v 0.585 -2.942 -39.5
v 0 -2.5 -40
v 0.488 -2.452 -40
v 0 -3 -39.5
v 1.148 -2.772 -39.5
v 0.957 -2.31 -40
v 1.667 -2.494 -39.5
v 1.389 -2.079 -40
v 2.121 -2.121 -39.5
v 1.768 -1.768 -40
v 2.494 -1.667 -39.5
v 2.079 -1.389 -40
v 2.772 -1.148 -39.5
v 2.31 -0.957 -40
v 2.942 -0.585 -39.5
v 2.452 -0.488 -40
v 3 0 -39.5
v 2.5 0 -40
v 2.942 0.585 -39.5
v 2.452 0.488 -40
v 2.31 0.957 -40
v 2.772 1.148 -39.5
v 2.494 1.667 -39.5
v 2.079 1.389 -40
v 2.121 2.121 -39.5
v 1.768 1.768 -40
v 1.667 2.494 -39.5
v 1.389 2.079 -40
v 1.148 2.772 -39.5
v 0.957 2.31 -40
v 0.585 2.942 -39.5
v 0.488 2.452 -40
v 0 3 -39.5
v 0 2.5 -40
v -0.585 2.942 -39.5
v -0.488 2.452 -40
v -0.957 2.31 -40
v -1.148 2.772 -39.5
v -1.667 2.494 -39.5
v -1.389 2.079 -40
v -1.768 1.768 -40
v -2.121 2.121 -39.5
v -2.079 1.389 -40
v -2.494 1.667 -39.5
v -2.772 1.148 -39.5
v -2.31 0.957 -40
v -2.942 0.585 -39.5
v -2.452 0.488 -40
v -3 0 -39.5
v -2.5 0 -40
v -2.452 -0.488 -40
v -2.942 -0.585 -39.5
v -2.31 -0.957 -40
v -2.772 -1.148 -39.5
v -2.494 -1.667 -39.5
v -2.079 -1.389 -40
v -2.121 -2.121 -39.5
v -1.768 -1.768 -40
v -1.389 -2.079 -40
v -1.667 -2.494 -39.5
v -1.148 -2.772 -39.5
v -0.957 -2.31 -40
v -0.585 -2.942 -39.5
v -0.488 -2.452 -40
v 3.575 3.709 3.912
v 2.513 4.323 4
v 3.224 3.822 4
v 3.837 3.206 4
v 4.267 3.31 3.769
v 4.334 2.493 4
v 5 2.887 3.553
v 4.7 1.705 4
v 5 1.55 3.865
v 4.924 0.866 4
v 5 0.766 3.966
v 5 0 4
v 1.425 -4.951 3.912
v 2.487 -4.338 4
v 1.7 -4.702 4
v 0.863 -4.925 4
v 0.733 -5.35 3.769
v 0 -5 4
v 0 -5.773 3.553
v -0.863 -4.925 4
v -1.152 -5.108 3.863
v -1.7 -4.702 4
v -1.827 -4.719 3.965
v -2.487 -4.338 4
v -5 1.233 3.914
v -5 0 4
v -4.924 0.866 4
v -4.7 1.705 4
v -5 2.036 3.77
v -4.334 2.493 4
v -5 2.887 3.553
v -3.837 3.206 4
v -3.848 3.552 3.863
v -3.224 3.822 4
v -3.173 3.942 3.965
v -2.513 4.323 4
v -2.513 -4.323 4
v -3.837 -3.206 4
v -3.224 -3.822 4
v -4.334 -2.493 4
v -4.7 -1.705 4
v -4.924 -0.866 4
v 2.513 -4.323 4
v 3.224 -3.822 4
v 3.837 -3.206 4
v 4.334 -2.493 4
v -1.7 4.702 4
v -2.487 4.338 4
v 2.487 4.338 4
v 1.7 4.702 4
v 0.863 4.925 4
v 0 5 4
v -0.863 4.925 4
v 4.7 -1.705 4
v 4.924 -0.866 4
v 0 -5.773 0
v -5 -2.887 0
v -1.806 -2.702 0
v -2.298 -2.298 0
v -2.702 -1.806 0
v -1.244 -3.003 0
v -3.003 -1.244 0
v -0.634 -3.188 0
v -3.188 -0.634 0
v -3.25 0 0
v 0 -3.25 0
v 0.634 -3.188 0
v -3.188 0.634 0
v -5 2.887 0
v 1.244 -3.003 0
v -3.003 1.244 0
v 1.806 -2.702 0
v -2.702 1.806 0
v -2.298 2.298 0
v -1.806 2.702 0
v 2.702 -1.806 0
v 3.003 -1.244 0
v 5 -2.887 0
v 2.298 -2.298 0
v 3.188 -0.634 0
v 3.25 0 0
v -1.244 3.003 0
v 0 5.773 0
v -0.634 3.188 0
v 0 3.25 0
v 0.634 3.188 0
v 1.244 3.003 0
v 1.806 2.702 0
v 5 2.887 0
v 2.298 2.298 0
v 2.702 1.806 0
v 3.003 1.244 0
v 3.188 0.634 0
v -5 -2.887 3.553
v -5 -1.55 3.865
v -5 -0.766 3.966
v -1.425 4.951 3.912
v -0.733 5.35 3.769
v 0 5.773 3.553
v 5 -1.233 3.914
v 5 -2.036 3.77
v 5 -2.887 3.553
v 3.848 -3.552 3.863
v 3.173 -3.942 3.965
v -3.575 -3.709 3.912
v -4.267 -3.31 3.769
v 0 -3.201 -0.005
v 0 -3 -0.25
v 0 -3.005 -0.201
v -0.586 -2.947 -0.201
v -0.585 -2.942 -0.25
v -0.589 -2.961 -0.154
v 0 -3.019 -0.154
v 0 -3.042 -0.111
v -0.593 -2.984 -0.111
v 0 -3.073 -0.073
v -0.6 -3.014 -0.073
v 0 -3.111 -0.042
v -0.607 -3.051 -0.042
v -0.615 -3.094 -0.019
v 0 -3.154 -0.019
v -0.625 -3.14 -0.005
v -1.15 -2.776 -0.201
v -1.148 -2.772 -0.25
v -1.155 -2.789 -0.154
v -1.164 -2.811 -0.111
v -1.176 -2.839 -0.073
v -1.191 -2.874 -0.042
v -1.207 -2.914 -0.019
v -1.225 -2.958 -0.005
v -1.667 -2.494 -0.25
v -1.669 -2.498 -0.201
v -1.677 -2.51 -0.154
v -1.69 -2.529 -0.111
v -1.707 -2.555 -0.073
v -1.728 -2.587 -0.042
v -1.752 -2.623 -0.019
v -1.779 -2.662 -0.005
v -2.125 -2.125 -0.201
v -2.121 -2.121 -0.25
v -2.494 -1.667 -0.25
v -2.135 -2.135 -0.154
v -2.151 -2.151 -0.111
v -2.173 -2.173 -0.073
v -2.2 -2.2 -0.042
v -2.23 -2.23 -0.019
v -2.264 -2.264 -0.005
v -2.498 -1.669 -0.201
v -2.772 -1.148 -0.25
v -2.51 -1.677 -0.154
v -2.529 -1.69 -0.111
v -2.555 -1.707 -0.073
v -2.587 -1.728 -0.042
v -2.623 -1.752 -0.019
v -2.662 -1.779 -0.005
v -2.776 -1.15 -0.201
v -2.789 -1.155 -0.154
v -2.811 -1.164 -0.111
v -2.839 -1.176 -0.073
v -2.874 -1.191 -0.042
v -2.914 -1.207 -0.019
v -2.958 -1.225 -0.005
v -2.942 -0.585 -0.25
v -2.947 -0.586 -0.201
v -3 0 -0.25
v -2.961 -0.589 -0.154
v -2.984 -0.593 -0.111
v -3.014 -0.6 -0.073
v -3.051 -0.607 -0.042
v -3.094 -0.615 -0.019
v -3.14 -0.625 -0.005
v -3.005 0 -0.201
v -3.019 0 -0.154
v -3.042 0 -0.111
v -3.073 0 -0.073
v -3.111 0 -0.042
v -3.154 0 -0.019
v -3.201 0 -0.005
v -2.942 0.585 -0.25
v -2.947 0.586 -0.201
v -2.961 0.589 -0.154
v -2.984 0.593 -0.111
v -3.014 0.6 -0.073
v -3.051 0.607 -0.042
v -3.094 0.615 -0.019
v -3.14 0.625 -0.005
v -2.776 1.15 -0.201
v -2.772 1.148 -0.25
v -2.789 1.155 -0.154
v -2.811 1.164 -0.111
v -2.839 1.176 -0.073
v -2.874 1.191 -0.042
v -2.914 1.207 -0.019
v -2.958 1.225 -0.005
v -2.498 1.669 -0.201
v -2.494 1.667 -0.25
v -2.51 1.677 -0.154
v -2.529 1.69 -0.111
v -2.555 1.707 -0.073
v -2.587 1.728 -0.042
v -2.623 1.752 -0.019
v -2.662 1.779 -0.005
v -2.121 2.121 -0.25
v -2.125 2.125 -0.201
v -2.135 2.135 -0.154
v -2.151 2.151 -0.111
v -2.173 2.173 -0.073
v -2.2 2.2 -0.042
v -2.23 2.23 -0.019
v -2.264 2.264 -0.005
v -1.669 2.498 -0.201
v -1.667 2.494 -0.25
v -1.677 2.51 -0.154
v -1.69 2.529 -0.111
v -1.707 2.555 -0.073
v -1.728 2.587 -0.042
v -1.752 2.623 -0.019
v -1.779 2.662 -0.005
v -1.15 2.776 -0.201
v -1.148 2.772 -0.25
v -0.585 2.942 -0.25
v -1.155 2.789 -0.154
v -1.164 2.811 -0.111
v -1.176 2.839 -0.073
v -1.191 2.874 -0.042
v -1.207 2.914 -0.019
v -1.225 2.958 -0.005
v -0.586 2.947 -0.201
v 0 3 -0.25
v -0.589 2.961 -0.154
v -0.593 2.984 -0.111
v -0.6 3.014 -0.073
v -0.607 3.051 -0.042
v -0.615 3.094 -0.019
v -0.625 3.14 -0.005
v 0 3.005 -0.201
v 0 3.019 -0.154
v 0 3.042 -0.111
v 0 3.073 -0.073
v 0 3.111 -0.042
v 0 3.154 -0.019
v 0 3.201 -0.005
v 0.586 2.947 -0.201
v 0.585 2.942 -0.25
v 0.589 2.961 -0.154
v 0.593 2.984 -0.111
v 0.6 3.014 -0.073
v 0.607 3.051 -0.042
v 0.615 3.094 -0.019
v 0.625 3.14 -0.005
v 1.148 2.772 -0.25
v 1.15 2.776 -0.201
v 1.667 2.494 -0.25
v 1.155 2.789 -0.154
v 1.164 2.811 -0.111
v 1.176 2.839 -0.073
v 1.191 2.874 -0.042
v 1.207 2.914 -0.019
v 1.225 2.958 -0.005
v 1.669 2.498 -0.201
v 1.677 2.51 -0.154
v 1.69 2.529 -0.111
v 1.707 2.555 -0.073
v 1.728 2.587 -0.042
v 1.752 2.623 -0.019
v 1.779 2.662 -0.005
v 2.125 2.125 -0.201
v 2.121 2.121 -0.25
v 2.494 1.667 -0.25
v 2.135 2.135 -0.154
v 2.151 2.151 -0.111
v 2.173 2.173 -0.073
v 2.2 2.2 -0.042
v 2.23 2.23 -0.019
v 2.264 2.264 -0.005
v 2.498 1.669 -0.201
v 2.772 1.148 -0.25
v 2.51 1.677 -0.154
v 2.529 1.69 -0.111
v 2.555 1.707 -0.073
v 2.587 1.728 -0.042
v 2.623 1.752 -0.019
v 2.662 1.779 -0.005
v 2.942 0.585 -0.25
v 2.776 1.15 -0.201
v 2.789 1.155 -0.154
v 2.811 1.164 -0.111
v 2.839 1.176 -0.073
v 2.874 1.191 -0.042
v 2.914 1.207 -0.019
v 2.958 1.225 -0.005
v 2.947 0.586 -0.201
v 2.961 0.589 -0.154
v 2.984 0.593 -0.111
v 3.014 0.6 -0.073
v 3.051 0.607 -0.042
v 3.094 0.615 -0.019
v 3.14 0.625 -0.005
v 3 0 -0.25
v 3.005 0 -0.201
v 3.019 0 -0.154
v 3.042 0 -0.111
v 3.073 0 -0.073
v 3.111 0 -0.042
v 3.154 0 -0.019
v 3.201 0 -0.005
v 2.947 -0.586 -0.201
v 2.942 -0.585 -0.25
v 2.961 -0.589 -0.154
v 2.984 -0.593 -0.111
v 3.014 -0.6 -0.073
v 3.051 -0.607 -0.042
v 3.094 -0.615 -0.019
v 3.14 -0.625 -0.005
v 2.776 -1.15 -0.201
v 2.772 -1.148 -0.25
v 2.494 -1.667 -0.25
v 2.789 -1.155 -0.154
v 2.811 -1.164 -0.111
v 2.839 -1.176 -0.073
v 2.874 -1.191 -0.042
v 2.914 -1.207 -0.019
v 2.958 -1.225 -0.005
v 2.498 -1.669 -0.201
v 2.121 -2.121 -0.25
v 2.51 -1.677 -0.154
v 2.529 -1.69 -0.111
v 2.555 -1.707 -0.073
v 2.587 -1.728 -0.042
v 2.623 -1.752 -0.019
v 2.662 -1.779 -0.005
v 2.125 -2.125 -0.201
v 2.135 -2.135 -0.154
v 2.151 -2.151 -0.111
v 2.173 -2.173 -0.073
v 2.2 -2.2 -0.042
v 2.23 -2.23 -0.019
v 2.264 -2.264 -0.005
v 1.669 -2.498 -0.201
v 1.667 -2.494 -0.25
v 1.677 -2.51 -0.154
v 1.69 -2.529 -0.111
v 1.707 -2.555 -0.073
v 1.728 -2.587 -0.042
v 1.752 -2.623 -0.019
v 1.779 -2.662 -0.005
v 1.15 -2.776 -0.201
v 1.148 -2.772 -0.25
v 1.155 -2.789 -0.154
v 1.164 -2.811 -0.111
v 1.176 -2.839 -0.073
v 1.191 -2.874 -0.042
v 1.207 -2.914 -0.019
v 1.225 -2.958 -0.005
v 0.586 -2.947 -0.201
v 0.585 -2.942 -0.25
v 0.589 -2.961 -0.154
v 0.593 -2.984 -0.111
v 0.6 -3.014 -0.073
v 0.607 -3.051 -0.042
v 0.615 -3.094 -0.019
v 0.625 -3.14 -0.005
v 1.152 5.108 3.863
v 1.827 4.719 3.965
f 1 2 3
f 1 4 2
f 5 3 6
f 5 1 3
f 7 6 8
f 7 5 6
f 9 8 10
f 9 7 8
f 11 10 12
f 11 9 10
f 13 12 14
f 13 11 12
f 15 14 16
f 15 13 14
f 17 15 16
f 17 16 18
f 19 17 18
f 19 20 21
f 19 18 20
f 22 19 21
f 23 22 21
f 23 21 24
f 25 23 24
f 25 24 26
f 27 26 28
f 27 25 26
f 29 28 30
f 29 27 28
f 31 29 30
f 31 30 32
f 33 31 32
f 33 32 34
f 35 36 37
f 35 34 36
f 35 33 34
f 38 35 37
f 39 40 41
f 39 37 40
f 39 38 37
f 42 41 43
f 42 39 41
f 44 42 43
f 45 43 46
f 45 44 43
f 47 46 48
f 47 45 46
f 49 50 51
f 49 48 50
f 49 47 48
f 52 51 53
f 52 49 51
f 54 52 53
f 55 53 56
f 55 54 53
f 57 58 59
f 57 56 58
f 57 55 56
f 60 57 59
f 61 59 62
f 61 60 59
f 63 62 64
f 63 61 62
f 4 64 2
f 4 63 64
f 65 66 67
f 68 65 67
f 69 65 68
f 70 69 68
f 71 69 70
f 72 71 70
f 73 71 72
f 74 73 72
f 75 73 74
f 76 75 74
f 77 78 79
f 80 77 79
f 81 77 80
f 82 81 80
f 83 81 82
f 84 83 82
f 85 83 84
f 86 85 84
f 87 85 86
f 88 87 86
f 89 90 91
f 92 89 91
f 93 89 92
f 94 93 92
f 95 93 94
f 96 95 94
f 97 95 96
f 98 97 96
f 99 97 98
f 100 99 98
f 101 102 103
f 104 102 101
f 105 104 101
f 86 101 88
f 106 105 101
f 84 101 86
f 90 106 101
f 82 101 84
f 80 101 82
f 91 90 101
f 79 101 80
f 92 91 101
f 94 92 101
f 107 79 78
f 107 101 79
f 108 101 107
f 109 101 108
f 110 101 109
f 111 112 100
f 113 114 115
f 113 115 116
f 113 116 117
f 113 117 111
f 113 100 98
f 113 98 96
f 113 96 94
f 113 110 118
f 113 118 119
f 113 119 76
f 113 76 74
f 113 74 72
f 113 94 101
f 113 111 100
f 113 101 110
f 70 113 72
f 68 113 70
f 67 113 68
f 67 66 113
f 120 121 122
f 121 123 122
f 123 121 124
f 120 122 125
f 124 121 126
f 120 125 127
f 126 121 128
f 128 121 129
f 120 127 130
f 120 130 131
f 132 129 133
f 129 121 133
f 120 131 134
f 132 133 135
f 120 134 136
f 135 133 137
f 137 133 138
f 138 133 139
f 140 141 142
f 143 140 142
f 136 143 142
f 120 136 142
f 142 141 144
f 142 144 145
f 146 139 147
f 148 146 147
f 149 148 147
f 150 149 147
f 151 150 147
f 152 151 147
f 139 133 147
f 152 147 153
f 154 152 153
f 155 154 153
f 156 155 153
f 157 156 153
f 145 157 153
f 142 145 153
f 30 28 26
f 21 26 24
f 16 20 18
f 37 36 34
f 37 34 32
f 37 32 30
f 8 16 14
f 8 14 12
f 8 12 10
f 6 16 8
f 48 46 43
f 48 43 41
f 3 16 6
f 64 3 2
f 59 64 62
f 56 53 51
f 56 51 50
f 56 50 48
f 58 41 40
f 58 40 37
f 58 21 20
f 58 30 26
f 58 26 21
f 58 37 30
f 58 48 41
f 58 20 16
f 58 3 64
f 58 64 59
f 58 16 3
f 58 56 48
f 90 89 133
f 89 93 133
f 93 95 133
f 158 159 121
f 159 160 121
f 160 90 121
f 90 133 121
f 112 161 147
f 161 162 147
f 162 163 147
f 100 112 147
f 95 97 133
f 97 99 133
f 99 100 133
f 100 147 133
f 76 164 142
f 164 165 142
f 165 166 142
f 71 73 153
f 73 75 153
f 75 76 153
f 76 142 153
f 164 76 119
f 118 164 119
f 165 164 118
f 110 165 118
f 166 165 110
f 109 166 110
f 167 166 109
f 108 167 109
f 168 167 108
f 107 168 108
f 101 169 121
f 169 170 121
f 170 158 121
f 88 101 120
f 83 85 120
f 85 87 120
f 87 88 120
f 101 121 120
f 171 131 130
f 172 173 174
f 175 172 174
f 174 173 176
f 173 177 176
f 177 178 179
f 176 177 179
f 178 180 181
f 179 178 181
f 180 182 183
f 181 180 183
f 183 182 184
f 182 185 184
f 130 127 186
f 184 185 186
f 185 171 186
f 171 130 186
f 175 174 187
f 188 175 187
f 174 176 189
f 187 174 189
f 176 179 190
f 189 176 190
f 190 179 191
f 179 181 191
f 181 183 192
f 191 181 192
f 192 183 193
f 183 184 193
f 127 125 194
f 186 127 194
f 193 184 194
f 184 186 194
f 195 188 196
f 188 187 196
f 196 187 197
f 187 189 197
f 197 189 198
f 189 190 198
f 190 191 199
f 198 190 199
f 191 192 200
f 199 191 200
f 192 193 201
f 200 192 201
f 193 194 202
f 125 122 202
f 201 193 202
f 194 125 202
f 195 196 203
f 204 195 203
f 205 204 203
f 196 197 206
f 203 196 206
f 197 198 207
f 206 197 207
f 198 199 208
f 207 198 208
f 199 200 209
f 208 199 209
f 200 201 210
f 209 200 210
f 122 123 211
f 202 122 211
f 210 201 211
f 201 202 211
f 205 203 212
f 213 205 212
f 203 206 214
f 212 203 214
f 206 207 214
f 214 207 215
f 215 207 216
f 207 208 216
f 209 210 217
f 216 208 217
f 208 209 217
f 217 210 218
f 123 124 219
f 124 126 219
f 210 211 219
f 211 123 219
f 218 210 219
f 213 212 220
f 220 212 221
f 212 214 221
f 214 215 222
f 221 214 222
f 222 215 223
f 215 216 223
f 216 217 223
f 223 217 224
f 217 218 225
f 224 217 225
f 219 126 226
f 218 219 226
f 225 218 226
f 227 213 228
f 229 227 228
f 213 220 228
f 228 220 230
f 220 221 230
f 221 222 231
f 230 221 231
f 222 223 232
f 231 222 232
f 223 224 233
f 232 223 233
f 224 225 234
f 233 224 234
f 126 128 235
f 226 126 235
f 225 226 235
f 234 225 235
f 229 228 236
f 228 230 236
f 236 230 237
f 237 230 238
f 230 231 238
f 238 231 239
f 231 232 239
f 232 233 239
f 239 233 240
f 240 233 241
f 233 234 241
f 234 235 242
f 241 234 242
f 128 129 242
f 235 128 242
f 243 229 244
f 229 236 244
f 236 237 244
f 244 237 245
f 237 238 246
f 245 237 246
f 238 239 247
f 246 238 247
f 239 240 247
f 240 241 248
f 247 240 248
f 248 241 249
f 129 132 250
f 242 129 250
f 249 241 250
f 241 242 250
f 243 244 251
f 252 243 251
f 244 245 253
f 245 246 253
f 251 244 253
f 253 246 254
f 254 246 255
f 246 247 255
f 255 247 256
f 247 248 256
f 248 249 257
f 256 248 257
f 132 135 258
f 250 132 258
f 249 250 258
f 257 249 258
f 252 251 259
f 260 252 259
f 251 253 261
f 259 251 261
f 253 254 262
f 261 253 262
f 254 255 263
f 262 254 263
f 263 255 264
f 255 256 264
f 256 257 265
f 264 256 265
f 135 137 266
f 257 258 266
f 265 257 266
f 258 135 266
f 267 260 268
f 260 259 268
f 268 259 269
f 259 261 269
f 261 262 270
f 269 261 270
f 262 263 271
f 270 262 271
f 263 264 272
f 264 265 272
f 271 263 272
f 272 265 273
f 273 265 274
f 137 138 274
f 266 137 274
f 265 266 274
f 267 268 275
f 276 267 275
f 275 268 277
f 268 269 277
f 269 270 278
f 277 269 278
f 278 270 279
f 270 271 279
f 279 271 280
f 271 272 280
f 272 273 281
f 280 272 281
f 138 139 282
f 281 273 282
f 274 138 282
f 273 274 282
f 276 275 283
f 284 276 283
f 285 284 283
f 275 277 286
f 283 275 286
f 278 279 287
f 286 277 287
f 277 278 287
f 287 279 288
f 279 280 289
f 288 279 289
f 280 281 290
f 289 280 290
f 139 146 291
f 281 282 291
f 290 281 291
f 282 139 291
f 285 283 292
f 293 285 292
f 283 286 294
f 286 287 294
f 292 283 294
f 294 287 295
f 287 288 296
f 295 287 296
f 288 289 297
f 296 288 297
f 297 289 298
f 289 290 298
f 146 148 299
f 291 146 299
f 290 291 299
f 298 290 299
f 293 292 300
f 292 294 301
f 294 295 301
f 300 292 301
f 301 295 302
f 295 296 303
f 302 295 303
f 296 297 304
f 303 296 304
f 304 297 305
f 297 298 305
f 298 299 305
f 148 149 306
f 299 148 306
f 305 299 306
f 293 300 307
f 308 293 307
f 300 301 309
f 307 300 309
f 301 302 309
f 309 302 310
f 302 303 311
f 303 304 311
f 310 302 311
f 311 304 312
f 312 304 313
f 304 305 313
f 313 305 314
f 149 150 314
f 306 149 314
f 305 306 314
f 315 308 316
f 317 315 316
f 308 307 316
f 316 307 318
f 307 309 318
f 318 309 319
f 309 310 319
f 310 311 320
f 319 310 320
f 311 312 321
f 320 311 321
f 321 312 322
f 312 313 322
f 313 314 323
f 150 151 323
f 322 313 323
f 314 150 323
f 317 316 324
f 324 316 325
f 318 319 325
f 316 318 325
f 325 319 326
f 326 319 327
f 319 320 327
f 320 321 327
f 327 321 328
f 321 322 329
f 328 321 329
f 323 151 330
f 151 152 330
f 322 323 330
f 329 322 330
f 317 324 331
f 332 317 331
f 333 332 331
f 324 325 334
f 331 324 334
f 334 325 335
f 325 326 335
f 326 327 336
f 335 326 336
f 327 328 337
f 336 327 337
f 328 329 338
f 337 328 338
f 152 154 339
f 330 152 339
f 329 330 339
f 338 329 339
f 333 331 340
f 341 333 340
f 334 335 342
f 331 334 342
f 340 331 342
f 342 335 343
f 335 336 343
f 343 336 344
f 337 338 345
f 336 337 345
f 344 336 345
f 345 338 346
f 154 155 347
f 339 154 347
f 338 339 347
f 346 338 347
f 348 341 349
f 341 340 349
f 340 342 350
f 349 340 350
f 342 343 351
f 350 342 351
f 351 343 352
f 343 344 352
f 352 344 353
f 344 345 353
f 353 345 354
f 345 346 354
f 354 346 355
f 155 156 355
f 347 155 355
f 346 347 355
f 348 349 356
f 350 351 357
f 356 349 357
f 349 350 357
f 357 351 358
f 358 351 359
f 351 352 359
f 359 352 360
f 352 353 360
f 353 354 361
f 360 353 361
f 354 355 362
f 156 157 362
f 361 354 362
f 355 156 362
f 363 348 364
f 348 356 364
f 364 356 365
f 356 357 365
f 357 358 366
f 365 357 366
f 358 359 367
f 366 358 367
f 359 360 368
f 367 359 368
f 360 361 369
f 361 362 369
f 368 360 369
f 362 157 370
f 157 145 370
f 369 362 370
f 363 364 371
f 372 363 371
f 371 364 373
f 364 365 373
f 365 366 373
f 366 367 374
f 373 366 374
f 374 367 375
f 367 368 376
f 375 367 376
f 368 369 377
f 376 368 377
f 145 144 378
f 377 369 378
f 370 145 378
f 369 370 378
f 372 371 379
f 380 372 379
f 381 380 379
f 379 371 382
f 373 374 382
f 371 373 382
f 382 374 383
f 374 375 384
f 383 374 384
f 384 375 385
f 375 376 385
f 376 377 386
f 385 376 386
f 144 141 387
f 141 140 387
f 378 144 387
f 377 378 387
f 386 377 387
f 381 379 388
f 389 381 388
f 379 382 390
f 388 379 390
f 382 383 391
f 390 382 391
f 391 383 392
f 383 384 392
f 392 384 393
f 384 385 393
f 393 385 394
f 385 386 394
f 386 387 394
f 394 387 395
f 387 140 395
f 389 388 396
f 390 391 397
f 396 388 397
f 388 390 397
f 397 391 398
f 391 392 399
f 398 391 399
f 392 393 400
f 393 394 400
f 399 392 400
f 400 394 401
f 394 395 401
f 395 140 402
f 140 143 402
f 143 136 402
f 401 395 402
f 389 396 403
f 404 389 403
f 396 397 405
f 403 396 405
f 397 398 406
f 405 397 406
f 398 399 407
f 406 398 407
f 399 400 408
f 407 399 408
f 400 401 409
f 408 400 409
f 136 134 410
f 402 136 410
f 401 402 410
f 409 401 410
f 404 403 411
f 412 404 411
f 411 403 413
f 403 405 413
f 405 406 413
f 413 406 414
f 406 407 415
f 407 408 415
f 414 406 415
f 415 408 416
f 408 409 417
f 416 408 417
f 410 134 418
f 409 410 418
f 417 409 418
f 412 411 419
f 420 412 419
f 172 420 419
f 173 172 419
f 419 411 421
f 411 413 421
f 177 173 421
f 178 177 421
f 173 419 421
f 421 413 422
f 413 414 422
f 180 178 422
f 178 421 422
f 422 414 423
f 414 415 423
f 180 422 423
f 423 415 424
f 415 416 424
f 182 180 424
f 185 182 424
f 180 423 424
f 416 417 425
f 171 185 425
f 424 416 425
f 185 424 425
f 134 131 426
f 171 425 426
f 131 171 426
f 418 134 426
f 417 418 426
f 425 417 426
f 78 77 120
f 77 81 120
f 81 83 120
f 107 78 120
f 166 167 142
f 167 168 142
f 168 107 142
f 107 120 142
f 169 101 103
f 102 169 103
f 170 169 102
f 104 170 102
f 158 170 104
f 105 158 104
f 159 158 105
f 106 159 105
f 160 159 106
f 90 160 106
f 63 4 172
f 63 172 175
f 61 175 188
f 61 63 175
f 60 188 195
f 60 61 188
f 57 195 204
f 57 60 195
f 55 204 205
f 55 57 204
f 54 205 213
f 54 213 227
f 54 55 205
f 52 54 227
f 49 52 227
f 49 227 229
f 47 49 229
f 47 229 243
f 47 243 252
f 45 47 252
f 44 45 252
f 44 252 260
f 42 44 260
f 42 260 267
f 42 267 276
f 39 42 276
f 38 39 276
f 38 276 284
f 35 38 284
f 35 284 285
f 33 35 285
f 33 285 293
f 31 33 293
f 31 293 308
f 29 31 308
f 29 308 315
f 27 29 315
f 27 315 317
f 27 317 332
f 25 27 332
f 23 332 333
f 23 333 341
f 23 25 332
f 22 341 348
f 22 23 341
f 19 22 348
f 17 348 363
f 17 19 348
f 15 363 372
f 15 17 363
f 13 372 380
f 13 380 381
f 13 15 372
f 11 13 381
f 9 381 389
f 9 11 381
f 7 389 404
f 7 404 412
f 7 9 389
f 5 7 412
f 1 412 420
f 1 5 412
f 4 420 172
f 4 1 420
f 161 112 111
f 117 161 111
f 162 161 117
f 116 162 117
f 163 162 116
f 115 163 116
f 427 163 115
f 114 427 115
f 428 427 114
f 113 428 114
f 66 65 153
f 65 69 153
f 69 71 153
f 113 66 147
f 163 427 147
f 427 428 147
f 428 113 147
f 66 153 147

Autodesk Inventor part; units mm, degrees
ref_plane "WorkPlane1" through (0, 0, 0) normal (0, 0, 1) x (1, 0, 0)
sketch "Szkic1" plane through (0, 0, 0) normal (0, 0, 1) x (1, 0, 0)
  point P0 (0, 0)
sketch "Szkic2" plane through (0, 0, 0) normal (0, 0, 1) x (1, 0, 0)
  line L0 (-5, 2.8868) -> (-5, -2.8868)
  line L1 (0, 5.7734) -> (-5, 2.8868)
  line L2 (5, 2.8868) -> (0, 5.7734)
  line L3 (5, -2.8868) -> (5, 2.8868)
  line L4 (0, -5.7734) -> (5, -2.8868)
  line L5 (-5, -2.8868) -> (0, -5.7734)
  circle A0 centre (0, 0) radius 5 construction
  dimension "d1" = 10
  dimension "d29" = 0
  dimension "d30" = 0
extrude "Wyciągnięcie proste1" add sketch "Szkic2" along normal blind 4
sketch "Szkic3" plane through (0, 0, 0) normal (1, 0, 0) x (0, 1, 0)
  line L0 (5, 4) -> (5.8734, 4)
  line L1 (5.8734, 3.4957) -> (5, 4)
  line L2 (5.8734, 4) -> (5.8734, 3.4957)
  line L3 (0, -0.8) -> (0, 4.8) projected
  line L4 (5.7734, 0) -> (5.7734, 4) projected
  dimension "d25" = 0.1
  dimension "d26" = 0
  dimension "d27" = 60
  dimension "d28" = 5
revolve "Obrót1" cut sketch "Szkic3" angle 360 about axis through (0, 0, -10) along (0, 0, 1)
sketch "Szkic4" plane through (0, 0, 0) normal (1, 0, 0) x (0, 1, 0)
  line L0 (0, -40) -> (0, 0)
  line L1 (-3, -40) -> (0, -40)
  line L2 (-3, 0) -> (-3, -40)
  line L3 (0, 0) -> (-3, 0)
  line L4 (0, -40) -> (0, 0)
  line L5 (-3.6, 0) -> (0.6, 0) projected
  line L6 (0, -48) -> (0, 8) projected
  dimension "d18" = 3
  dimension "d20" = 40
  dimension "d33" = 0
  dimension "d34" = 0
revolve "Obrót2" add sketch "Szkic4" angle 360 about axis through (0, 0, -40) along (0, 0, -1)
chamfer "Faza1" distance 0.5 angle 45 1 edges at (0, 3, -40)
fillet "Zaokrąglenie1" radius 0.25 1 edges at (0, 3, 0)
thread "Gwint1" size "M6x1" class "6g" standard "ISO Metric profile" length 18
ref_plane "MSC_PF1" through (0, 0, 0) normal (1, 0, 0) x (0, 1, 0)
ref_plane "MSC_PT1" through (0, 0, 0) normal (0, 0, -1) x (-1, 0, 0)
equation "\"d1\" = ParS"
equation "\"d6\" = ParK"
equation "\"d22\" = 0.5 * PTC"
equation "\"d23\" = 0.5 * PTC"
equation "\"d24\" = r"
equation "\"d28\" = 0.5 * ParS"
equation "\"d18\" = 0.5 * NND"
equation "\"d20\" = NLG"
equation "\"NND\" = 6"
equation "\"NLG\" = 40"
equation "\"PTC\" = 1"
equation "\"ParK\" = 4"
equation "\"ParS\" = 10"
equation "\"msp_es\" = 0.577367 * ParS"
equation "\"r\" = 0.25"
equation "\"THREADDIA\" = NND"
properties part number "ISO 4016 - M6 x 40" material "Stal"
